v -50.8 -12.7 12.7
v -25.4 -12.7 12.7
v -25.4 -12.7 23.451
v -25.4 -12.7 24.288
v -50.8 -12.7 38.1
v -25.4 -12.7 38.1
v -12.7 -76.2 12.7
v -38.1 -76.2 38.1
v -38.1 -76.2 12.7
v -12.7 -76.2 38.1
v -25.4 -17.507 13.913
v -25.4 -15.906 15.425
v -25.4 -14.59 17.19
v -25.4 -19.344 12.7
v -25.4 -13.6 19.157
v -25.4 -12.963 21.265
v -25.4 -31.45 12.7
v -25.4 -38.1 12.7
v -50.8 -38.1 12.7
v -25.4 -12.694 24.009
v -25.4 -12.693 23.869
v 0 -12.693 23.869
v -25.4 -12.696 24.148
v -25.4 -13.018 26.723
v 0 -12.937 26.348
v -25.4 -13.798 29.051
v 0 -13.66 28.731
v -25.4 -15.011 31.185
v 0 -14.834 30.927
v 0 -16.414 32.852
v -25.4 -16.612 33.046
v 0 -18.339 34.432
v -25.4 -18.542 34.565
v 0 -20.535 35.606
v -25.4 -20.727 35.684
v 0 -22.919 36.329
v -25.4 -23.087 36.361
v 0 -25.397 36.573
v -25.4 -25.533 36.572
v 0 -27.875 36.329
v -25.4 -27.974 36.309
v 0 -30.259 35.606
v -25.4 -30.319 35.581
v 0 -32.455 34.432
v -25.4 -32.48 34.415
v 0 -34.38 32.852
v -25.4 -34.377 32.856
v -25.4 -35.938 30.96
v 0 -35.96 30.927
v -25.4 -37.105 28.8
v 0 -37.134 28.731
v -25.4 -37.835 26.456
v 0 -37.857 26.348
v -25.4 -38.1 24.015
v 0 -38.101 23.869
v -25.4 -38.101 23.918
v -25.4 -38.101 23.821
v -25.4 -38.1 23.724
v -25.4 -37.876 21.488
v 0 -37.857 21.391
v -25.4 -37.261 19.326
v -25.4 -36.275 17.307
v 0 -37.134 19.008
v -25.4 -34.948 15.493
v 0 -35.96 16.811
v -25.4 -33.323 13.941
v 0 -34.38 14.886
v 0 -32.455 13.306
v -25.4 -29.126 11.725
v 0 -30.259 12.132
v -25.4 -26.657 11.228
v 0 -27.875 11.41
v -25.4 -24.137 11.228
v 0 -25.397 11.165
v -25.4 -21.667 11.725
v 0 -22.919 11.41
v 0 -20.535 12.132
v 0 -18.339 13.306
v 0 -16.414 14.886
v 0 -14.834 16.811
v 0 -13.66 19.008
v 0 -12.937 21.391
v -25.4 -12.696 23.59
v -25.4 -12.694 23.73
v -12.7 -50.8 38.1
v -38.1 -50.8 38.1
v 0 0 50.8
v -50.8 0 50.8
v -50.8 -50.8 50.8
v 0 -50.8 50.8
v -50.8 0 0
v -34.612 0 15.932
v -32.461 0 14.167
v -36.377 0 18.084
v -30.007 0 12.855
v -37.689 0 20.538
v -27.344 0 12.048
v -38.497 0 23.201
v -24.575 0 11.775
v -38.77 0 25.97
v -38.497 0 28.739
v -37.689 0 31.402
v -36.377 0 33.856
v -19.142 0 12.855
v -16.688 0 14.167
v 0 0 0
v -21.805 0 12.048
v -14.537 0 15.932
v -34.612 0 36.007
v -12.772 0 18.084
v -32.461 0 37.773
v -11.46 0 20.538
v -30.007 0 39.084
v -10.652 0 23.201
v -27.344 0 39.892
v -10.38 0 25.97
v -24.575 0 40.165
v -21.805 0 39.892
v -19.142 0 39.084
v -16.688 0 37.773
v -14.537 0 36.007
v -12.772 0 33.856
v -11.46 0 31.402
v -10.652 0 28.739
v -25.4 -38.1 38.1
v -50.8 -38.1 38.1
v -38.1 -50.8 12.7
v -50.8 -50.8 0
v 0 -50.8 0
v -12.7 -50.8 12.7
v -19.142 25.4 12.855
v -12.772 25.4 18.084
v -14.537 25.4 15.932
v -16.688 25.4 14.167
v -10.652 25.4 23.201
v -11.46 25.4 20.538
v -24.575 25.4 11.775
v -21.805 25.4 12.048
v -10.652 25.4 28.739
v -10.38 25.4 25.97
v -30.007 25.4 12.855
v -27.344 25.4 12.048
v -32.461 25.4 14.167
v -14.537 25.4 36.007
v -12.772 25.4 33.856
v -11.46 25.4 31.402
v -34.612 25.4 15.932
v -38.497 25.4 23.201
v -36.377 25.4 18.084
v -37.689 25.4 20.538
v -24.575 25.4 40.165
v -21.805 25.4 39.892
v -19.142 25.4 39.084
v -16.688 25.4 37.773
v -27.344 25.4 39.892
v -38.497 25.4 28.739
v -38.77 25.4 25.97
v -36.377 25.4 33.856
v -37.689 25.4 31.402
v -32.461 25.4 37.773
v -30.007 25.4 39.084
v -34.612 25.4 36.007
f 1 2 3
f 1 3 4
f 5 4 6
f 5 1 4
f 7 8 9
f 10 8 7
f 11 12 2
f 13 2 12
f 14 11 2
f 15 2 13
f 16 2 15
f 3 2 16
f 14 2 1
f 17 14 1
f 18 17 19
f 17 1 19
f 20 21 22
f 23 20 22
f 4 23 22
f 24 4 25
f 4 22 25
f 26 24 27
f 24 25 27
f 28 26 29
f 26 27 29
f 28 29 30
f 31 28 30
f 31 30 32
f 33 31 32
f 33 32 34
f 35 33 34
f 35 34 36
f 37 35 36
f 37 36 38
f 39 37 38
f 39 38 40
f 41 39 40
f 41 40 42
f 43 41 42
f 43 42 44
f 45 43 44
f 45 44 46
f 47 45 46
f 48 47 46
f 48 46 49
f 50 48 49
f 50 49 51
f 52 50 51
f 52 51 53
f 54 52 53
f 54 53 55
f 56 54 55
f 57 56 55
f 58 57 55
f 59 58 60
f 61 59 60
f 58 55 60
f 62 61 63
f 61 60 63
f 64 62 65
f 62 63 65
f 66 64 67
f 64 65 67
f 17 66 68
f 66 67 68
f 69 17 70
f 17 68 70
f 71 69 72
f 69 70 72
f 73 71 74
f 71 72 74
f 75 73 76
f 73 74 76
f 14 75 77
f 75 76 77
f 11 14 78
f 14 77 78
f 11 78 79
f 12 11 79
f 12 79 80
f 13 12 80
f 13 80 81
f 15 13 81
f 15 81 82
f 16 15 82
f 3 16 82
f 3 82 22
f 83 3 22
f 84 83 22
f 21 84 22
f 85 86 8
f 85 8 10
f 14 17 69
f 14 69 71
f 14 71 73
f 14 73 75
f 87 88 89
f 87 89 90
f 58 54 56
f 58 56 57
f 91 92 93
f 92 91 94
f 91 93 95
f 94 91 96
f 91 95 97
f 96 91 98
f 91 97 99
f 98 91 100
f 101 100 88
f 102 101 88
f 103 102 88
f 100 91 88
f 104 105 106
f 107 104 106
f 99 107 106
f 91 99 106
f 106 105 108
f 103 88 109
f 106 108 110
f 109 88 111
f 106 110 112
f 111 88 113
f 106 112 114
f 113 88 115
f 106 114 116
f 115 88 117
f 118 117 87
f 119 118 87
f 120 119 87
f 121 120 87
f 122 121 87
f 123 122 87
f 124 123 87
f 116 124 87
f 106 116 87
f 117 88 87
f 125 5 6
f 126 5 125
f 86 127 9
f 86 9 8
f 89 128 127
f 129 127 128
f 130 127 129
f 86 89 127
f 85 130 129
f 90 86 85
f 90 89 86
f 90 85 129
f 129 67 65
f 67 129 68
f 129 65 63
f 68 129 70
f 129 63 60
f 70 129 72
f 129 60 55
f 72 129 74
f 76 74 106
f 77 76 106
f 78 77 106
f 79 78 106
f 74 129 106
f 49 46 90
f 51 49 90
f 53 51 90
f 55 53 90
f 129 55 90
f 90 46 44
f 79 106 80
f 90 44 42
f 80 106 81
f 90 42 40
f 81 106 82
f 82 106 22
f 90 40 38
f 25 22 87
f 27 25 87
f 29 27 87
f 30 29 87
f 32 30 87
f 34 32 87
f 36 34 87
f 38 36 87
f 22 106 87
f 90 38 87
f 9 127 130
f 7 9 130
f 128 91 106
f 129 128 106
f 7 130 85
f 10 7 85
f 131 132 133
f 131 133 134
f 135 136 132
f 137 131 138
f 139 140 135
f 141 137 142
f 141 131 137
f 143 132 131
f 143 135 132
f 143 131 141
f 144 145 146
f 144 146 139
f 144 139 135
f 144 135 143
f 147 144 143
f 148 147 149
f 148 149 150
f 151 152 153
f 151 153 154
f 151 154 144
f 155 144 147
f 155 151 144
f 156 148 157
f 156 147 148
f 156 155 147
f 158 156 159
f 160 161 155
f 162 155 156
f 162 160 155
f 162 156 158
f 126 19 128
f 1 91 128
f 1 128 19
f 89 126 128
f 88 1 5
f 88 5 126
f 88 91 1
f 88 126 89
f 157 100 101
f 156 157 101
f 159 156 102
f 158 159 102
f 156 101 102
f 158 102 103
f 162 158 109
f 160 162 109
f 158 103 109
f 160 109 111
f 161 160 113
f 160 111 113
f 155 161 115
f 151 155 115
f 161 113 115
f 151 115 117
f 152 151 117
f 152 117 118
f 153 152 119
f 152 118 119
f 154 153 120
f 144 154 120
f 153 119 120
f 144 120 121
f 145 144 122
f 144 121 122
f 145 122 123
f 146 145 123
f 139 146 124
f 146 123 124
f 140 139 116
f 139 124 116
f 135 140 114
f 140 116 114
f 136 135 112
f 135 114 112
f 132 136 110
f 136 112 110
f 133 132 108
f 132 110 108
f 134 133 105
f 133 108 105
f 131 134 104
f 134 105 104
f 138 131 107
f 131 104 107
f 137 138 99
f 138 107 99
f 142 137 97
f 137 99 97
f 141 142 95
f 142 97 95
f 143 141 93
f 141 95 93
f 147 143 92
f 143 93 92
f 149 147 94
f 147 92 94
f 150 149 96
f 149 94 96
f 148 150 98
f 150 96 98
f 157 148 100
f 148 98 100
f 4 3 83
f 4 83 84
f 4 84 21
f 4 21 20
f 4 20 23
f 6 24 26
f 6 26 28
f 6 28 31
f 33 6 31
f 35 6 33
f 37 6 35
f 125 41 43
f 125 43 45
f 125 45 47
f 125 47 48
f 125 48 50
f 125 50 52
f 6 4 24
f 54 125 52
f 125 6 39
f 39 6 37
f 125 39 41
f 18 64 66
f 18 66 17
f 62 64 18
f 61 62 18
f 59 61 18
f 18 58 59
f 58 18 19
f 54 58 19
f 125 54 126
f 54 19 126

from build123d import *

# Parameters (mm, degrees)
F0_W     = 50.8
F0_H     = 50.8
F1_DEPTH = 50.8
F2_W     = 25.4
F2_H     = 25.4
F3_DEPTH = 25.4
F4_W     = 25.4
F4_H     = 25.4
F5_DEPTH = 25.4
F6_R     = 12.703868
F7_DEPTH = 25.4
F8_R     = 14.195008
F9_DEPTH = 25.4


with BuildPart() as f1:
    # F0 (on Front) → F1 (new body)
    with BuildSketch(Plane.XZ):
        with Locations((-25.4, 25.4)):
            Rectangle(F0_W, F0_H)
    extrude(amount=F1_DEPTH)

    # F2 (on face) → F3 (join)
    with BuildSketch(Plane.XZ.offset(50.8)):
        with Locations((-25.4, 25.4)):
            Rectangle(F2_W, F2_H)
    extrude(amount=F3_DEPTH)

    # F4 (on face) → F5 (cut)
    with BuildSketch(Plane(origin=(-50.8, 0, 0), x_dir=(0, -1, 0), z_dir=(-1, 0, 0))):
        with Locations((25.4, 25.4)):
            Rectangle(F4_W, F4_H)
    extrude(amount=-F5_DEPTH, mode=Mode.SUBTRACT)

    # F6 (on face) → F7 (cut)
    with BuildSketch(Plane.YZ):
        with Locations((-25.396969, 23.869332)):
            Circle(F6_R)
    extrude(amount=-F7_DEPTH, mode=Mode.SUBTRACT)

    # F8 (on face) → F9 (join)
    with BuildSketch(Plane(origin=(0, 0, 0), x_dir=(-1, 0, 0), z_dir=(0, 1, 0))):
        with Locations((24.574604, 25.969833)):
            Circle(F8_R)
    extrude(amount=F9_DEPTH)


solid = f1.part
